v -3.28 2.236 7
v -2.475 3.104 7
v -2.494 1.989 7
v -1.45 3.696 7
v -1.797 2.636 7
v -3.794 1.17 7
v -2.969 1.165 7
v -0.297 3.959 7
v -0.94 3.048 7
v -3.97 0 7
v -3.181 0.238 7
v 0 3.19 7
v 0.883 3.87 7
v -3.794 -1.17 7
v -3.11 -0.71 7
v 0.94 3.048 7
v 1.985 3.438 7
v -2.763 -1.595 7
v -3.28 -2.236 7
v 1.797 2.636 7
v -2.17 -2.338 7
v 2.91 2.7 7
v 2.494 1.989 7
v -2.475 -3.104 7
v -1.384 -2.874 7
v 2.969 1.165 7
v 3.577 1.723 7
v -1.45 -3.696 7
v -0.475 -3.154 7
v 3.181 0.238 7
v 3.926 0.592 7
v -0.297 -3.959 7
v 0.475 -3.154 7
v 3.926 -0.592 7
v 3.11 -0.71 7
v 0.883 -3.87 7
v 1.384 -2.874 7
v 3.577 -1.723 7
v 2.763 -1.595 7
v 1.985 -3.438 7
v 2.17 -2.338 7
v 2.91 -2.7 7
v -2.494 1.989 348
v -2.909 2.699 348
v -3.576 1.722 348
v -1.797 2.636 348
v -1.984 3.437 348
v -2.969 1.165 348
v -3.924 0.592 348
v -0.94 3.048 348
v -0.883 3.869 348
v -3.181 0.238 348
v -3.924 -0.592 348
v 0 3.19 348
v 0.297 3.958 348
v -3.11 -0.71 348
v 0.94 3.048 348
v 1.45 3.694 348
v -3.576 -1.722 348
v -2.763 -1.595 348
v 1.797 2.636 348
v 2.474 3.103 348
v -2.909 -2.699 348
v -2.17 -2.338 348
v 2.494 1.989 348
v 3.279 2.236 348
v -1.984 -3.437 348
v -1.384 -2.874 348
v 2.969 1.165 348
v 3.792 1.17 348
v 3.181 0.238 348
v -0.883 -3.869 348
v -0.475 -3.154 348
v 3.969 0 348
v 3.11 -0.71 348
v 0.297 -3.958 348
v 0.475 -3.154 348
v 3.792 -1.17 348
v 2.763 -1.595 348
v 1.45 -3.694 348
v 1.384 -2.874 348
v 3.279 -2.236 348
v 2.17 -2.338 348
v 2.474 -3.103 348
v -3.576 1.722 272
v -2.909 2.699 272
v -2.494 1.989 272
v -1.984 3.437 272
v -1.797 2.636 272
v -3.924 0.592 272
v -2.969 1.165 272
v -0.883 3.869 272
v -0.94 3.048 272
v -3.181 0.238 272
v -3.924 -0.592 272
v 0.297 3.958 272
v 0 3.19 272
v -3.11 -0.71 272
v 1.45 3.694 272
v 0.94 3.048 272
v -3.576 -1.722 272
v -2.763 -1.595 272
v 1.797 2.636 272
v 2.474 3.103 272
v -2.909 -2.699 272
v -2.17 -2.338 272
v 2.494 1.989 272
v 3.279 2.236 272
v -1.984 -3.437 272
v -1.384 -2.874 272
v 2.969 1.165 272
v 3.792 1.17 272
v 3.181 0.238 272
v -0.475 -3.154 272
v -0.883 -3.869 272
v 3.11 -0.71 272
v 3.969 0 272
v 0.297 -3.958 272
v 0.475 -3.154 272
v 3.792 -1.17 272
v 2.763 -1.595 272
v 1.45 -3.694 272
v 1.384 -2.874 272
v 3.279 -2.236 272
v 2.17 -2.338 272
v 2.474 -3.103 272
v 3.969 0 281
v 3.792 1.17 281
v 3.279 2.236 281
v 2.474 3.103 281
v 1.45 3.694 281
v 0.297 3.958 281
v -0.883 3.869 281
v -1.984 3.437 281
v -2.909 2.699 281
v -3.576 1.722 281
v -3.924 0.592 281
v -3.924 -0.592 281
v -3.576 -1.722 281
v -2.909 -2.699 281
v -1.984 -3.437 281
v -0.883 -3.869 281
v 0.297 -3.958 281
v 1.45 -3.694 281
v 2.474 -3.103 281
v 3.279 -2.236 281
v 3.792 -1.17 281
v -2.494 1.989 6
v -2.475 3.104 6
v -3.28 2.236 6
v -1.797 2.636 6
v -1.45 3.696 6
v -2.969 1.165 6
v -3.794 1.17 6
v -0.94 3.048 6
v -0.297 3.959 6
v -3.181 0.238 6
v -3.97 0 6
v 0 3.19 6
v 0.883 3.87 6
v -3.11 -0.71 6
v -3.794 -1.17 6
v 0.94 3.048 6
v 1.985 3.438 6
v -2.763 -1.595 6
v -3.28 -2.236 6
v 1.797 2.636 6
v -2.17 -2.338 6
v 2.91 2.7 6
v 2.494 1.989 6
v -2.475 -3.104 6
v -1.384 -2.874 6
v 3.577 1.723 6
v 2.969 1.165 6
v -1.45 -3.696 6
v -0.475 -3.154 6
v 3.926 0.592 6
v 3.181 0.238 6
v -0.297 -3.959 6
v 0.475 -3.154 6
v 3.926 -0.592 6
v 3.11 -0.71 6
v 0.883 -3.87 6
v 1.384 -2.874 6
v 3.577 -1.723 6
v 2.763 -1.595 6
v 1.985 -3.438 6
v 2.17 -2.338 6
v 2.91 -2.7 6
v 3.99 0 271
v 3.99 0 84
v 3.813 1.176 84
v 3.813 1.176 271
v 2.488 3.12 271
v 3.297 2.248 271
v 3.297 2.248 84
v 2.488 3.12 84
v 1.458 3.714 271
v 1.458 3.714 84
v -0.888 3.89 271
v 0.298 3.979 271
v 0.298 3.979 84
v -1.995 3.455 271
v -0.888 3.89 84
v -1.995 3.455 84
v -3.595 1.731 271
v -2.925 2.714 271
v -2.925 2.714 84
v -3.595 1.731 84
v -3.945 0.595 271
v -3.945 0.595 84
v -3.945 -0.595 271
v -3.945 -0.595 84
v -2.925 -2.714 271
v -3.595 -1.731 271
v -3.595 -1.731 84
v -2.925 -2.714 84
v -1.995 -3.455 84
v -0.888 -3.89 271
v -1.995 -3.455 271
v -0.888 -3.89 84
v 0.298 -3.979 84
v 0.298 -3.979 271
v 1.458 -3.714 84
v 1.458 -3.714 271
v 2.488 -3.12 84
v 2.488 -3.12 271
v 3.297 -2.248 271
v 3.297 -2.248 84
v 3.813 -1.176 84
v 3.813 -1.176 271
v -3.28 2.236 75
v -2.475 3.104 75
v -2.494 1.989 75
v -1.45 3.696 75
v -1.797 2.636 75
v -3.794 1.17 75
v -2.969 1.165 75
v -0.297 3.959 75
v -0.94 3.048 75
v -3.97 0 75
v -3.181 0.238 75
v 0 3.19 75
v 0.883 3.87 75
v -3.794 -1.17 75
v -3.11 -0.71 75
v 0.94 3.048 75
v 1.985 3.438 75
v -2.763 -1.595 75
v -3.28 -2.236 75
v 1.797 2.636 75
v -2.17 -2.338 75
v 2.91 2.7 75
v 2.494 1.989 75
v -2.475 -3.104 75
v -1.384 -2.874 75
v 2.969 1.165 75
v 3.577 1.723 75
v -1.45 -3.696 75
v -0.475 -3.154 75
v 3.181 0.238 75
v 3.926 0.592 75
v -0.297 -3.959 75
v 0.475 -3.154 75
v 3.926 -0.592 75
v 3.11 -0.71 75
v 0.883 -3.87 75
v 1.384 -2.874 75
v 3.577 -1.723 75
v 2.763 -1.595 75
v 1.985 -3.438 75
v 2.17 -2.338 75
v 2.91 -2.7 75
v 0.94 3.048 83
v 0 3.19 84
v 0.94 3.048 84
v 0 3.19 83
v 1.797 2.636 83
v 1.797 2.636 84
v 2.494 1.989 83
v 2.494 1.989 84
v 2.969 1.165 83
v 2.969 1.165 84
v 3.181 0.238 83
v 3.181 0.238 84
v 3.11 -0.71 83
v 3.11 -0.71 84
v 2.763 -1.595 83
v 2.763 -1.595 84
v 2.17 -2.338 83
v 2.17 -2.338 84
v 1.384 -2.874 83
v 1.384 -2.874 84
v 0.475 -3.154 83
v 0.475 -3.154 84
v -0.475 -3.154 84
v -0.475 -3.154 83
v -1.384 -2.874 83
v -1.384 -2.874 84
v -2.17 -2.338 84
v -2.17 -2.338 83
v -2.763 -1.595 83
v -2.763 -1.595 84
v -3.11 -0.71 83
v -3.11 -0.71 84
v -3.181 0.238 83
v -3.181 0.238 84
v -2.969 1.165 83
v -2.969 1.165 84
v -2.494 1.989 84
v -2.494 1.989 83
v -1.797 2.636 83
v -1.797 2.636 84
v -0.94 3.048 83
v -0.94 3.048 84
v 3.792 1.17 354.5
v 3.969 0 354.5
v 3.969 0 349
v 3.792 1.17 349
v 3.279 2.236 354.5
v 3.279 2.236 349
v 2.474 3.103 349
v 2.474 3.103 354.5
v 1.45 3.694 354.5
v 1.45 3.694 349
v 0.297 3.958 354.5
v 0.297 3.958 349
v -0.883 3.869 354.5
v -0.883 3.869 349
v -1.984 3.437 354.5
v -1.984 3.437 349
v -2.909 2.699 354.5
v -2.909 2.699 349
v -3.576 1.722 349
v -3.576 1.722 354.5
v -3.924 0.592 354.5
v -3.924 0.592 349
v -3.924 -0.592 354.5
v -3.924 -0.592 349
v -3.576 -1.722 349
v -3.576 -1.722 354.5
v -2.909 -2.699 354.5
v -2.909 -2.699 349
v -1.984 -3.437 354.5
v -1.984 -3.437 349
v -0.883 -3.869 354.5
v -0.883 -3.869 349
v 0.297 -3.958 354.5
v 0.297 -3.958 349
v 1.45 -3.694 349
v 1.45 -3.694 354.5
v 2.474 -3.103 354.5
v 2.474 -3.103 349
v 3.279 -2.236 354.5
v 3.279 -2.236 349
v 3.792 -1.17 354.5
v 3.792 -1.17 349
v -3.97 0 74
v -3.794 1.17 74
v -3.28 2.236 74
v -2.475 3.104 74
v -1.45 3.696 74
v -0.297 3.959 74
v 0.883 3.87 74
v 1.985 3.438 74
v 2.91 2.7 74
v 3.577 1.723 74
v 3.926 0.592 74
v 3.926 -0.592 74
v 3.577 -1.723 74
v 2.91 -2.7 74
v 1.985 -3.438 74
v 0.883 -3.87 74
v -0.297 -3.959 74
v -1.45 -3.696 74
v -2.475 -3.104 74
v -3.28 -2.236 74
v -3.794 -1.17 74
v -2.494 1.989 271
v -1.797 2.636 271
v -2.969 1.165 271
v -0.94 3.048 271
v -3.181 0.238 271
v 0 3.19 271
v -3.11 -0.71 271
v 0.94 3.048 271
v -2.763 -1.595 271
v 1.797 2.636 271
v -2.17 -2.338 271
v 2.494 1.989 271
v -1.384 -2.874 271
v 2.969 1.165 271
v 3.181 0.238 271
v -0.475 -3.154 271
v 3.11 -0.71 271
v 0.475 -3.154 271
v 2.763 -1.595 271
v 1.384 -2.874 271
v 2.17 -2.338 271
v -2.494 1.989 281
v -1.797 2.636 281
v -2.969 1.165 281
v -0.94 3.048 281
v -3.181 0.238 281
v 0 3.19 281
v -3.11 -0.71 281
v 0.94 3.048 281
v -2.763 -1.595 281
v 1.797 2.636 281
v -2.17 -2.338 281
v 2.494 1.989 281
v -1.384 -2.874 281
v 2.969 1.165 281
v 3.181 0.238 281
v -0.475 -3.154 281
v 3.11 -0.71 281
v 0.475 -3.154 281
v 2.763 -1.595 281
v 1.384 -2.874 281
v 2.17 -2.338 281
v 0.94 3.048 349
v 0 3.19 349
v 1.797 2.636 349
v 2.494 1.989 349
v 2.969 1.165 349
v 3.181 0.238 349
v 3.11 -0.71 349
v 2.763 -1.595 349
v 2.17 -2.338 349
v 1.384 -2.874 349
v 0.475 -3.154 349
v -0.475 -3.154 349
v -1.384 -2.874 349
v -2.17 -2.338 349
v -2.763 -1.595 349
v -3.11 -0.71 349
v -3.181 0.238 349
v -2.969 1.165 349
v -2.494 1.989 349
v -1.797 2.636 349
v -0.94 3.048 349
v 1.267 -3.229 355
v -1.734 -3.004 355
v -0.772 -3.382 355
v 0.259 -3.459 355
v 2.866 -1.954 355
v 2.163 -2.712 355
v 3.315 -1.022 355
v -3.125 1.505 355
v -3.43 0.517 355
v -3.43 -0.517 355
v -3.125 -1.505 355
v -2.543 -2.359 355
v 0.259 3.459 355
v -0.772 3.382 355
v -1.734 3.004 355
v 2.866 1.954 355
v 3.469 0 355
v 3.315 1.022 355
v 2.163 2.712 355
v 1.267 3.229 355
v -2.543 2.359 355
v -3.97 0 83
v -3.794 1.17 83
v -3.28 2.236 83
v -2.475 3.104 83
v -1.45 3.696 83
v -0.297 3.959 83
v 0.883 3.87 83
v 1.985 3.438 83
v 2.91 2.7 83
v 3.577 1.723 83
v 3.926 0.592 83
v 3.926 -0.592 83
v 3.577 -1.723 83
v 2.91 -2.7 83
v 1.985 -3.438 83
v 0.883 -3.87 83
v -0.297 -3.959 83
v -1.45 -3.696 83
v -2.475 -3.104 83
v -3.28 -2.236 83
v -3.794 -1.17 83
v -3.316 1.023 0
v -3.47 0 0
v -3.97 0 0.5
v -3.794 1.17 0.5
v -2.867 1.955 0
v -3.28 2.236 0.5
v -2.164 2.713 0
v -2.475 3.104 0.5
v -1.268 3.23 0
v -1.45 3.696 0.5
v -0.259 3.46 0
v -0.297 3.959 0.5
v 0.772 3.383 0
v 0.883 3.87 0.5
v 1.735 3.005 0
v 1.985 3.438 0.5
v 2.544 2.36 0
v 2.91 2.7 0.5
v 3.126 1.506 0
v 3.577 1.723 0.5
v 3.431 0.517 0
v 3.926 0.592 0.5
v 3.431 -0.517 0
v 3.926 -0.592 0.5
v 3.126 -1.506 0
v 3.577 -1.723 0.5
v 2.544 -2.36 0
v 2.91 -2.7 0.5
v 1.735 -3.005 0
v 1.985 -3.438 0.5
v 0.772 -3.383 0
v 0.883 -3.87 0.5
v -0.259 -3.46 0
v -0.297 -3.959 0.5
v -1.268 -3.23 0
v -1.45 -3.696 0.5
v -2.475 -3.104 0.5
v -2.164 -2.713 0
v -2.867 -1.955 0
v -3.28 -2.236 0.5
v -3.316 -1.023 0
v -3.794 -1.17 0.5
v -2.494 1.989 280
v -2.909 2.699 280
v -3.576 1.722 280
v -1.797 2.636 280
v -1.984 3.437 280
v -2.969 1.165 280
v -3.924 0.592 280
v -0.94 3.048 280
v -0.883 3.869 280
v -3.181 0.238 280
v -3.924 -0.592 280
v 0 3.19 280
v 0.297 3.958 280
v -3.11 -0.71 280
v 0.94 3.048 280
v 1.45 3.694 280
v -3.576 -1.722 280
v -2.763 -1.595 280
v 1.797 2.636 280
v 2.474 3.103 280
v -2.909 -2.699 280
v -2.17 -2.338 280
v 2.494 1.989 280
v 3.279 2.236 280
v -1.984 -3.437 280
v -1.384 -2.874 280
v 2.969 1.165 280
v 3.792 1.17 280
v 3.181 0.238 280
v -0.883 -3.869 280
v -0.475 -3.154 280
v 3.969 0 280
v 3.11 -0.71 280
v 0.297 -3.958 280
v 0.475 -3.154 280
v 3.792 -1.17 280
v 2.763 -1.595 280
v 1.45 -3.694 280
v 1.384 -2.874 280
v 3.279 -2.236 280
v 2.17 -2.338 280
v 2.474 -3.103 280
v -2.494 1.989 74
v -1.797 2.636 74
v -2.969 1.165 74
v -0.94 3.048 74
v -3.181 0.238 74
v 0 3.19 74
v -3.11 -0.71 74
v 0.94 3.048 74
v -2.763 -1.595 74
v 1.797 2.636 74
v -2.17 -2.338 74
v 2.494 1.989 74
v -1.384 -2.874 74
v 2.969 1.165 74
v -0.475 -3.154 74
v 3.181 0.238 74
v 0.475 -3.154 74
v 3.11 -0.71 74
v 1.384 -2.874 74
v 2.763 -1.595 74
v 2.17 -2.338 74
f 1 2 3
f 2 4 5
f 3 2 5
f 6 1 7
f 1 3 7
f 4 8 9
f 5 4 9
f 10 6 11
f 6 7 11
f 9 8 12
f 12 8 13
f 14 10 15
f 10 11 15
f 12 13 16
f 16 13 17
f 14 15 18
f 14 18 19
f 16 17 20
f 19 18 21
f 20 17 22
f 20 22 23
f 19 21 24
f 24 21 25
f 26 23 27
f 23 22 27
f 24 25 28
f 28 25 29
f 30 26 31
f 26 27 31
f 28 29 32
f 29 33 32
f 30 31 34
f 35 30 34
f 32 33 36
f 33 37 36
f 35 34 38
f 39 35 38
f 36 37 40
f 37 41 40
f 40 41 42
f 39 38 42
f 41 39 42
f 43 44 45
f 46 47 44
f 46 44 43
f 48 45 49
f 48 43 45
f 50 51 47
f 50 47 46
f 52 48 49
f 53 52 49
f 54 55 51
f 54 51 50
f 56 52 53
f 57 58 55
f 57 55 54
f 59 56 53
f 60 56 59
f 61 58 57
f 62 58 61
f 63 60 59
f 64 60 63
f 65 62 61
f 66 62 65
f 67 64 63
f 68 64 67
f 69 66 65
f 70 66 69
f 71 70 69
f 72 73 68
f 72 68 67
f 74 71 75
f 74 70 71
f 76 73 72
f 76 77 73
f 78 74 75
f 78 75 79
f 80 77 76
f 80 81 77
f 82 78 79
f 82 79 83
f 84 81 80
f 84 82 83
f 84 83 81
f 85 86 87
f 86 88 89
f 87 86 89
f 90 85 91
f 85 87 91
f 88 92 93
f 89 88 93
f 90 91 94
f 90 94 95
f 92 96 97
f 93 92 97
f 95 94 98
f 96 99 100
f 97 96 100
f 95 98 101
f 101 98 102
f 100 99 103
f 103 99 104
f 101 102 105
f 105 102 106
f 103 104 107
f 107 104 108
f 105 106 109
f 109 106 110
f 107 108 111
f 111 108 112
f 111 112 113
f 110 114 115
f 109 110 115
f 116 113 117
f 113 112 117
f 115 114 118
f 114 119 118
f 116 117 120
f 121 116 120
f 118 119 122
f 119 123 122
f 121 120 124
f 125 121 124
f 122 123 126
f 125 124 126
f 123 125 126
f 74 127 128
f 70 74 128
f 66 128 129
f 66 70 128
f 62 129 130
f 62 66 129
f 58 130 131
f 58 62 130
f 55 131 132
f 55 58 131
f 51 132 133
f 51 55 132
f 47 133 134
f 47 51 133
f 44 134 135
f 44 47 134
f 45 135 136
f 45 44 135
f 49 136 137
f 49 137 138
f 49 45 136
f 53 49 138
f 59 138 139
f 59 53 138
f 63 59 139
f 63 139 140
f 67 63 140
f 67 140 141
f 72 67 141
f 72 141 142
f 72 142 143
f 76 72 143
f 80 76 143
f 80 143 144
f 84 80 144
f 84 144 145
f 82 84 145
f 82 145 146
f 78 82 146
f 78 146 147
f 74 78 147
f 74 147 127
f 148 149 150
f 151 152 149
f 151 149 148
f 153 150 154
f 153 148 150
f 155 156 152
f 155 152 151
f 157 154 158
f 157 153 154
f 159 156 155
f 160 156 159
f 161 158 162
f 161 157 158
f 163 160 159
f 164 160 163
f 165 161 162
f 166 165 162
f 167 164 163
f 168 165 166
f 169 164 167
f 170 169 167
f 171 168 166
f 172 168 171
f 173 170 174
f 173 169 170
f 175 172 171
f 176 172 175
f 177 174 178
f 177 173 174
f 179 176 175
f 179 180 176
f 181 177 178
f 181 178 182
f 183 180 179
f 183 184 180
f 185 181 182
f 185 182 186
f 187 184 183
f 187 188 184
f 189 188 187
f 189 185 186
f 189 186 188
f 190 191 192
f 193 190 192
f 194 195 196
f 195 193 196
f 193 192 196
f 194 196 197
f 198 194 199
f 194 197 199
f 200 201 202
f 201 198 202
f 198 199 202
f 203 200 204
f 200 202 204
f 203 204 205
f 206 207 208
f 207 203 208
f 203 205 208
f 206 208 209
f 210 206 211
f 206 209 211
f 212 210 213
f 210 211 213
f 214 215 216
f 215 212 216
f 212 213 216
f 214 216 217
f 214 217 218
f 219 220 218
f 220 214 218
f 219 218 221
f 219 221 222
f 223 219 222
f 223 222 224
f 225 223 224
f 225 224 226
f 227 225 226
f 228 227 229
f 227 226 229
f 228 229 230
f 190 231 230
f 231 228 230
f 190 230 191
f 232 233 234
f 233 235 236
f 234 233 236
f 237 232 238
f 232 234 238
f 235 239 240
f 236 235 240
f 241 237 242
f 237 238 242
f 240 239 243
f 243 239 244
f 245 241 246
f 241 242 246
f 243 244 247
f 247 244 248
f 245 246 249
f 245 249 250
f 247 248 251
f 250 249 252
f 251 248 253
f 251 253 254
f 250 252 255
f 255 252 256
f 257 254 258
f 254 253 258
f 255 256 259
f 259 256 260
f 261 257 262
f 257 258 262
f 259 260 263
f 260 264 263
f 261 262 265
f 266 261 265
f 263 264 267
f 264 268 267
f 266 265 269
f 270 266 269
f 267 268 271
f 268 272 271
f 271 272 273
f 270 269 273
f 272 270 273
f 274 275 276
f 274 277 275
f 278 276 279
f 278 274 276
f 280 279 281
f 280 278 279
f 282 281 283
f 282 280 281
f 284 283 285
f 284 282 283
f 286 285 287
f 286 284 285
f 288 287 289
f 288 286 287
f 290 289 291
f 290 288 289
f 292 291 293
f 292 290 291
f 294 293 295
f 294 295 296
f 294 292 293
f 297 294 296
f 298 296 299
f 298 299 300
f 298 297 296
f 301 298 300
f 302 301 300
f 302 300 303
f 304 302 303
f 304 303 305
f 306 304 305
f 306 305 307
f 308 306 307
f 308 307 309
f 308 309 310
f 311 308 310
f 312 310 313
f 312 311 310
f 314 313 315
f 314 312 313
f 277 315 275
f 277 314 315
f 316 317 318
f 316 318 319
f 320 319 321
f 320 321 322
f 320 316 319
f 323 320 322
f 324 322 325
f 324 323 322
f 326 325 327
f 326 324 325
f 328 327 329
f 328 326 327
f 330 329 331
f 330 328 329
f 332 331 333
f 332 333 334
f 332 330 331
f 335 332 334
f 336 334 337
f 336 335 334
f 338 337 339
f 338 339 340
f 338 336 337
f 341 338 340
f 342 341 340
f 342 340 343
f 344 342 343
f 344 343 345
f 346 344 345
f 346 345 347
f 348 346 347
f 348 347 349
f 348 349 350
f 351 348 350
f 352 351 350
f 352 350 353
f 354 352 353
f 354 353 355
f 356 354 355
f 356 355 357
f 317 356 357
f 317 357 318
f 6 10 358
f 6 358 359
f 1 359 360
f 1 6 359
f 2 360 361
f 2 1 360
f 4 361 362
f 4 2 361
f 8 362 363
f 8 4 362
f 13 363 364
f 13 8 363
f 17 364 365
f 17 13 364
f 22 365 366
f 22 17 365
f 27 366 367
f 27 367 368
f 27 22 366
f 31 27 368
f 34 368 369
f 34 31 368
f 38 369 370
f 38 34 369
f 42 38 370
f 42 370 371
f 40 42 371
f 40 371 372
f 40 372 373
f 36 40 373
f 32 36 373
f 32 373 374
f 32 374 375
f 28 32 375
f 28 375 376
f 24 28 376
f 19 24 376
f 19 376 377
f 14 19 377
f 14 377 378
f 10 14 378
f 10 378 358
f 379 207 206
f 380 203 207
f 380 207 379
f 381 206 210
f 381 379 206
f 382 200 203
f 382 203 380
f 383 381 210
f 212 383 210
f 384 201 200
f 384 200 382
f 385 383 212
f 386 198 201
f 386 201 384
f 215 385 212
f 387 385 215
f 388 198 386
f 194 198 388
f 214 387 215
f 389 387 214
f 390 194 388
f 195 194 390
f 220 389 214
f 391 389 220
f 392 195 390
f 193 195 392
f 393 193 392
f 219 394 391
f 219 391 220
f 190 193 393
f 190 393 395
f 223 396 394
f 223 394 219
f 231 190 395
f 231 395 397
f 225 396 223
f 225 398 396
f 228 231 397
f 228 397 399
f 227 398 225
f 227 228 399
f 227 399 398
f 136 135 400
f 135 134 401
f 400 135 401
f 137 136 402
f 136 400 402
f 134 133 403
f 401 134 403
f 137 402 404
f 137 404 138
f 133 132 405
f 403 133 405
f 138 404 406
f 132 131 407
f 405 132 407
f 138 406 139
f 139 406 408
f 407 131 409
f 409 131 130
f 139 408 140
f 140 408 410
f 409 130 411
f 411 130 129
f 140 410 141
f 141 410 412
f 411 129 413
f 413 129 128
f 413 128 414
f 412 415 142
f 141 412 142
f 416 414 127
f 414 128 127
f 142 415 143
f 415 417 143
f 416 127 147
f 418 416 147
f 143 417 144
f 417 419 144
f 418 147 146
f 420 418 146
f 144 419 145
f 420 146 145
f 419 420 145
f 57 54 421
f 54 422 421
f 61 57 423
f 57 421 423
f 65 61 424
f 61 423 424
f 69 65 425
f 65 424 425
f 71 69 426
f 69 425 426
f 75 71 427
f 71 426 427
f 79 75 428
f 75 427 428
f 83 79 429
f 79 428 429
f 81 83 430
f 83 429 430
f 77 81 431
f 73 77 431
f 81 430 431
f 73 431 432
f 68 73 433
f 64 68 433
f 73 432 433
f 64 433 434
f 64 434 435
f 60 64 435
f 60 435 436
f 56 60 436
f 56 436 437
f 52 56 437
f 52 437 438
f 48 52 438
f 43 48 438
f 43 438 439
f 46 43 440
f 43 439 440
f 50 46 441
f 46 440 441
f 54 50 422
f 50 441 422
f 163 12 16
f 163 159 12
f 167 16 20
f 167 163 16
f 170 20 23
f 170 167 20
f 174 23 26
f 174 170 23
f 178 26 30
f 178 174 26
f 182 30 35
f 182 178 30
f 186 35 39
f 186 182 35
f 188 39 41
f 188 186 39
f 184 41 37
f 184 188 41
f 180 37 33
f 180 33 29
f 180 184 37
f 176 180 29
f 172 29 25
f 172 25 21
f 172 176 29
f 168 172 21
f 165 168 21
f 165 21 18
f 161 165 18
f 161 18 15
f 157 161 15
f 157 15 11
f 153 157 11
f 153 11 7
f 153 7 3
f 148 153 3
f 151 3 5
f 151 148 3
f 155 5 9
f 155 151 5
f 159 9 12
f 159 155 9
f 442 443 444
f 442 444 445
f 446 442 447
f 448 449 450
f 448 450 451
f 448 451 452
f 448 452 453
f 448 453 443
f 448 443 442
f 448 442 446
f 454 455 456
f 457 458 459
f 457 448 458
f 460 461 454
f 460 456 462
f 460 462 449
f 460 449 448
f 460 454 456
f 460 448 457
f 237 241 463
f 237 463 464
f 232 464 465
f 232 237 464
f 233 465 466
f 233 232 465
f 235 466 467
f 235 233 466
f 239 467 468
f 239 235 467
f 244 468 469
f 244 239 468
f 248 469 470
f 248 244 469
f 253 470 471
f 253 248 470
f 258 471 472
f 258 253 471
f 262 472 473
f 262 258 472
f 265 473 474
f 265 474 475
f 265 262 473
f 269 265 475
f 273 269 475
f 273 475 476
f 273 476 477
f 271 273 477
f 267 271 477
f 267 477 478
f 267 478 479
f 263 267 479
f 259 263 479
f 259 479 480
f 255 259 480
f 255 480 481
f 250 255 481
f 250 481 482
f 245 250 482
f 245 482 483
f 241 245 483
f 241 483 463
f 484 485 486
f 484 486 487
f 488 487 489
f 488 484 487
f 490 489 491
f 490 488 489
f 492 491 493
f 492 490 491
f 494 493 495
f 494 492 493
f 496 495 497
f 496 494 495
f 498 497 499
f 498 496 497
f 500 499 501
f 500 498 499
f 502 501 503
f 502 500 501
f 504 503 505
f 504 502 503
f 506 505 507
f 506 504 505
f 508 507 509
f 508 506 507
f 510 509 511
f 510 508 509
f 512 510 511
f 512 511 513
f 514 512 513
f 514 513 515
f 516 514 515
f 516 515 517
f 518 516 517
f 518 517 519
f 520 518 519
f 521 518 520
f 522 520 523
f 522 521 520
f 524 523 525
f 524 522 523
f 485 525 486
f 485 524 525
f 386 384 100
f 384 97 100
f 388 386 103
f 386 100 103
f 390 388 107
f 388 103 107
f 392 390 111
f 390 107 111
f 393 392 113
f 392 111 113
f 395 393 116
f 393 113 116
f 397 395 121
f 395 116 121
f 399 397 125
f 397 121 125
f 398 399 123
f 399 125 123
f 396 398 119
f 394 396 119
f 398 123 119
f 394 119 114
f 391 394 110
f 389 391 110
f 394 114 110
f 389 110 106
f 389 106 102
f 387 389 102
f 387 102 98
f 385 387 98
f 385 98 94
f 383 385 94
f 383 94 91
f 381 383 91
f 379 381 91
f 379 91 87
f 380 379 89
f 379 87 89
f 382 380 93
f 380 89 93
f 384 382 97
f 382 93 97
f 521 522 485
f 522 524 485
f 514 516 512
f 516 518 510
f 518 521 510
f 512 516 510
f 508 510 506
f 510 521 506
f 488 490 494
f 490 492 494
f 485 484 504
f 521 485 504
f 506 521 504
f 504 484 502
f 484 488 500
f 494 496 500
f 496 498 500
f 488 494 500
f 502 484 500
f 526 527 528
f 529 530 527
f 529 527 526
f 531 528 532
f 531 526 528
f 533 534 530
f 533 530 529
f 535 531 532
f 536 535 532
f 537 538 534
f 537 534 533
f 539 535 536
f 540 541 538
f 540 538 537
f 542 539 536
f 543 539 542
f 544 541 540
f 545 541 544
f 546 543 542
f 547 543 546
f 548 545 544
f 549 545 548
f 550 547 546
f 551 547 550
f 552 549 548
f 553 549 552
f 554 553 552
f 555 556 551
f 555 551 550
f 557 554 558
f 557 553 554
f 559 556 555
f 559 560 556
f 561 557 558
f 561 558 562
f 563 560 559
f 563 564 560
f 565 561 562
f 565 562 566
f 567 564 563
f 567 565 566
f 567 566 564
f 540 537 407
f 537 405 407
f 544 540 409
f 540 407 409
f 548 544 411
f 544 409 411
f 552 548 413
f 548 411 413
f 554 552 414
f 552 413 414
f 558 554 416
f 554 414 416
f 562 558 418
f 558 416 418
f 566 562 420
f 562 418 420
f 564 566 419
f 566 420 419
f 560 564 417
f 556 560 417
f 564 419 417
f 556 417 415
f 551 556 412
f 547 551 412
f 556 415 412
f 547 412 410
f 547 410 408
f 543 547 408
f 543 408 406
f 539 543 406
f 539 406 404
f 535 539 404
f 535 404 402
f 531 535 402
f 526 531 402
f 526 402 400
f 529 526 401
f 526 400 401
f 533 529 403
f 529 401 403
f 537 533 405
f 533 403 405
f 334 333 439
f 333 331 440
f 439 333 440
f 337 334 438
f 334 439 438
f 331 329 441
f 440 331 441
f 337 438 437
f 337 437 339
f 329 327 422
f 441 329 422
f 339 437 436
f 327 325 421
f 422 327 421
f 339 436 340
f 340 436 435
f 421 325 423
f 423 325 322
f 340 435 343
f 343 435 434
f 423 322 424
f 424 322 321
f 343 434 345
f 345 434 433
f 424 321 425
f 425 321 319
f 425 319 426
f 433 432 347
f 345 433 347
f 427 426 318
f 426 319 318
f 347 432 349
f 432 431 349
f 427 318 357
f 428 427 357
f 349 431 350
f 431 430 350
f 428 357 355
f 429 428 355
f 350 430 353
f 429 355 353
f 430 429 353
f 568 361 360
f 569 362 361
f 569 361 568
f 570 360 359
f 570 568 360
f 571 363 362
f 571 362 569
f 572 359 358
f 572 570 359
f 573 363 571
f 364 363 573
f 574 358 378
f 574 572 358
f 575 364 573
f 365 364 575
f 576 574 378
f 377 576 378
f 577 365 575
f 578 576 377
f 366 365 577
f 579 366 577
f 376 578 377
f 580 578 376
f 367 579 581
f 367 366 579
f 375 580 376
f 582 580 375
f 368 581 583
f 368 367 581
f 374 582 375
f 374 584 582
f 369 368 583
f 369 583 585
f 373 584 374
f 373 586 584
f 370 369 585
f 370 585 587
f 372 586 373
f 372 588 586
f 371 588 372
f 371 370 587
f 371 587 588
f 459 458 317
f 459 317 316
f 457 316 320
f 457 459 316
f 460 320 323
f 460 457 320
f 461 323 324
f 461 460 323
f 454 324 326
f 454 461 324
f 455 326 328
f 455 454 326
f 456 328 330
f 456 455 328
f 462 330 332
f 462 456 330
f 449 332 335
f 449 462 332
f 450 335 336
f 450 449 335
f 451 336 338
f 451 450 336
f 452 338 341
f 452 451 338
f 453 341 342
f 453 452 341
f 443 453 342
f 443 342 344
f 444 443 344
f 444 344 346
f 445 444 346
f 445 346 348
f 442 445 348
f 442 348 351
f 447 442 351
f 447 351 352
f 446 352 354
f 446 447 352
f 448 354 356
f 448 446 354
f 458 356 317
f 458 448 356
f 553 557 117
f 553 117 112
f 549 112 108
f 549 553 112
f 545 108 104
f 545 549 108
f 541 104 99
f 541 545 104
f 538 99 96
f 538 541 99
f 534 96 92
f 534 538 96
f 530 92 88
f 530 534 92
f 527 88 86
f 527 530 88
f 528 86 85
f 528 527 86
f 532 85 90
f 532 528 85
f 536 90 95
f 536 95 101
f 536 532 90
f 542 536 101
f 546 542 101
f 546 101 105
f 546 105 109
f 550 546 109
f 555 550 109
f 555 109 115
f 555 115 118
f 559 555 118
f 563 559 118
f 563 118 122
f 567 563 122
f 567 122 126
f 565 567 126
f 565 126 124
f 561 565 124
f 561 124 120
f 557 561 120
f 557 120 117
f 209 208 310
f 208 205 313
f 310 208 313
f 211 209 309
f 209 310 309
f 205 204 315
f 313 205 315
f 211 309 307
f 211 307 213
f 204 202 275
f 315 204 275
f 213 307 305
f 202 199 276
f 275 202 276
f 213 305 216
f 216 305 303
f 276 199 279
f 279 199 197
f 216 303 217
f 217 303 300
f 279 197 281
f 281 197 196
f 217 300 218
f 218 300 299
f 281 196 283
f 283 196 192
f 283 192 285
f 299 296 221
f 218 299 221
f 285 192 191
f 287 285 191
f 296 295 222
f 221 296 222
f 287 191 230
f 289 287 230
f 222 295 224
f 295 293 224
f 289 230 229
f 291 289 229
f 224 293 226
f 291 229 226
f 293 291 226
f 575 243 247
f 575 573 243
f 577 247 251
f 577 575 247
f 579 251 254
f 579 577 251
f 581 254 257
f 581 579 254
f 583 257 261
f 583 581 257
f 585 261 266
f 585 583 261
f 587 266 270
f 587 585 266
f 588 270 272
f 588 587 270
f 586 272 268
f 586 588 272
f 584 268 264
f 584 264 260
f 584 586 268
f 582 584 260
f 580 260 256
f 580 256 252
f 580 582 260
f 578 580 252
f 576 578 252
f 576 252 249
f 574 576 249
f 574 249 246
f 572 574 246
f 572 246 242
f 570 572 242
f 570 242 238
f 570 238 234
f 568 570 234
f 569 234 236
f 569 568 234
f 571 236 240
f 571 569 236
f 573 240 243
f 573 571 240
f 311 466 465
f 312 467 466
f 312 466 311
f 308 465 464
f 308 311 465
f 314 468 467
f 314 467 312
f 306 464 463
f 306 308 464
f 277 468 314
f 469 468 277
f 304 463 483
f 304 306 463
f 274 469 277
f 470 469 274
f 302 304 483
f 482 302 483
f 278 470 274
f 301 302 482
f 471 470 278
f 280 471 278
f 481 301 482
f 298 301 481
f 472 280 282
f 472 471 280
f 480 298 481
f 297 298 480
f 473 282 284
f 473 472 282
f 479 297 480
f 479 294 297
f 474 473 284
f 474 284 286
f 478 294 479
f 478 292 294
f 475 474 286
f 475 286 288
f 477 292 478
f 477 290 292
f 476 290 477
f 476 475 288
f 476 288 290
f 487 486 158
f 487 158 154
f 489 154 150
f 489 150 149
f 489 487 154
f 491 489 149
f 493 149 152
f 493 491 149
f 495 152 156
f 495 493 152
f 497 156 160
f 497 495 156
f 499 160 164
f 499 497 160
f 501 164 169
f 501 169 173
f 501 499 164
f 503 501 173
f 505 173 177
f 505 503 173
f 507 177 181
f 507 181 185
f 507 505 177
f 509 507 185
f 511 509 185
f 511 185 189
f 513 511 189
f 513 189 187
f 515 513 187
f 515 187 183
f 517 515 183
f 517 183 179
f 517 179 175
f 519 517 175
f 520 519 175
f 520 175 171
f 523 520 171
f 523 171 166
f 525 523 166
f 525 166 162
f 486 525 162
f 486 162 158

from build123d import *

# Parameters (mm, degrees)
CROQUIS1_R              = 3.99
SALIENTE_EXTRUIR1_DEPTH = 355
CROQUIS2_W              = 1
CROQUIS2_H              = 0.8
CROQUIS5_R              = 3.99
CROQUIS5_R_2            = 3.96875
CORTAR_EXTRUIR1_DEPTH   = 84
CROQUIS6_R              = 3.99
CROQUIS6_R_2            = 3.97
CORTAR_EXTRUIR2_DEPTH   = 84
CHAFL_N1_SIZE           = 0.5


with BuildPart() as part:
    # Croquis1 → Saliente-Extruir1 (new body)
    with BuildSketch(Plane.XY):
        Circle(CROQUIS1_R)
    extrude(amount=SALIENTE_EXTRUIR1_DEPTH)

    # Croquis2 → Cortar-Revolución1 (revolve, cut)
    with BuildSketch(Plane(origin=(0, 0, 0), x_dir=(0, 0, -1), z_dir=(1, 0, 0))):
        with Locations((-6.5, 3.59)):
            Rectangle(CROQUIS2_W, CROQUIS2_H)
        with Locations((-74.5, 3.59)):
            Rectangle(CROQUIS2_W, CROQUIS2_H)
        with Locations((-83.5, 3.59)):
            Rectangle(CROQUIS2_W, CROQUIS2_H)
    cortar_revoluci_n1 = revolve(axis=Axis((0, 0, 355), (0, 0, -1)), mode=Mode.SUBTRACT)

    # Simetría1: Cortar-Revolución1 across plane
    add(cortar_revoluci_n1.mirror(Plane.XY.offset(177.5)), mode=Mode.SUBTRACT)

    # Croquis5 → Cortar-Extruir1 (cut)
    with BuildSketch(Plane.XY.offset(355)):
        Circle(CROQUIS5_R)
        Circle(CROQUIS5_R_2, mode=Mode.SUBTRACT)
    extrude(amount=-CORTAR_EXTRUIR1_DEPTH, mode=Mode.SUBTRACT)

    # Croquis6 → Cortar-Extruir2 (cut)
    with BuildSketch(Plane(origin=(0, 0, 0), x_dir=(-1, 0, 0), z_dir=(0, 0, -1))):
        Circle(CROQUIS6_R)
        Circle(CROQUIS6_R_2, mode=Mode.SUBTRACT)
    extrude(amount=-CORTAR_EXTRUIR2_DEPTH, mode=Mode.SUBTRACT)

    # Chaflán1
    chafl_n1_edges = [part.edges().sort_by_distance(p)[0] for p in [
        (-3.96875, 0, 355),
        (3.97, 0, 0),
    ]]
    chamfer(chafl_n1_edges, length=CHAFL_N1_SIZE)


solid = part.part
